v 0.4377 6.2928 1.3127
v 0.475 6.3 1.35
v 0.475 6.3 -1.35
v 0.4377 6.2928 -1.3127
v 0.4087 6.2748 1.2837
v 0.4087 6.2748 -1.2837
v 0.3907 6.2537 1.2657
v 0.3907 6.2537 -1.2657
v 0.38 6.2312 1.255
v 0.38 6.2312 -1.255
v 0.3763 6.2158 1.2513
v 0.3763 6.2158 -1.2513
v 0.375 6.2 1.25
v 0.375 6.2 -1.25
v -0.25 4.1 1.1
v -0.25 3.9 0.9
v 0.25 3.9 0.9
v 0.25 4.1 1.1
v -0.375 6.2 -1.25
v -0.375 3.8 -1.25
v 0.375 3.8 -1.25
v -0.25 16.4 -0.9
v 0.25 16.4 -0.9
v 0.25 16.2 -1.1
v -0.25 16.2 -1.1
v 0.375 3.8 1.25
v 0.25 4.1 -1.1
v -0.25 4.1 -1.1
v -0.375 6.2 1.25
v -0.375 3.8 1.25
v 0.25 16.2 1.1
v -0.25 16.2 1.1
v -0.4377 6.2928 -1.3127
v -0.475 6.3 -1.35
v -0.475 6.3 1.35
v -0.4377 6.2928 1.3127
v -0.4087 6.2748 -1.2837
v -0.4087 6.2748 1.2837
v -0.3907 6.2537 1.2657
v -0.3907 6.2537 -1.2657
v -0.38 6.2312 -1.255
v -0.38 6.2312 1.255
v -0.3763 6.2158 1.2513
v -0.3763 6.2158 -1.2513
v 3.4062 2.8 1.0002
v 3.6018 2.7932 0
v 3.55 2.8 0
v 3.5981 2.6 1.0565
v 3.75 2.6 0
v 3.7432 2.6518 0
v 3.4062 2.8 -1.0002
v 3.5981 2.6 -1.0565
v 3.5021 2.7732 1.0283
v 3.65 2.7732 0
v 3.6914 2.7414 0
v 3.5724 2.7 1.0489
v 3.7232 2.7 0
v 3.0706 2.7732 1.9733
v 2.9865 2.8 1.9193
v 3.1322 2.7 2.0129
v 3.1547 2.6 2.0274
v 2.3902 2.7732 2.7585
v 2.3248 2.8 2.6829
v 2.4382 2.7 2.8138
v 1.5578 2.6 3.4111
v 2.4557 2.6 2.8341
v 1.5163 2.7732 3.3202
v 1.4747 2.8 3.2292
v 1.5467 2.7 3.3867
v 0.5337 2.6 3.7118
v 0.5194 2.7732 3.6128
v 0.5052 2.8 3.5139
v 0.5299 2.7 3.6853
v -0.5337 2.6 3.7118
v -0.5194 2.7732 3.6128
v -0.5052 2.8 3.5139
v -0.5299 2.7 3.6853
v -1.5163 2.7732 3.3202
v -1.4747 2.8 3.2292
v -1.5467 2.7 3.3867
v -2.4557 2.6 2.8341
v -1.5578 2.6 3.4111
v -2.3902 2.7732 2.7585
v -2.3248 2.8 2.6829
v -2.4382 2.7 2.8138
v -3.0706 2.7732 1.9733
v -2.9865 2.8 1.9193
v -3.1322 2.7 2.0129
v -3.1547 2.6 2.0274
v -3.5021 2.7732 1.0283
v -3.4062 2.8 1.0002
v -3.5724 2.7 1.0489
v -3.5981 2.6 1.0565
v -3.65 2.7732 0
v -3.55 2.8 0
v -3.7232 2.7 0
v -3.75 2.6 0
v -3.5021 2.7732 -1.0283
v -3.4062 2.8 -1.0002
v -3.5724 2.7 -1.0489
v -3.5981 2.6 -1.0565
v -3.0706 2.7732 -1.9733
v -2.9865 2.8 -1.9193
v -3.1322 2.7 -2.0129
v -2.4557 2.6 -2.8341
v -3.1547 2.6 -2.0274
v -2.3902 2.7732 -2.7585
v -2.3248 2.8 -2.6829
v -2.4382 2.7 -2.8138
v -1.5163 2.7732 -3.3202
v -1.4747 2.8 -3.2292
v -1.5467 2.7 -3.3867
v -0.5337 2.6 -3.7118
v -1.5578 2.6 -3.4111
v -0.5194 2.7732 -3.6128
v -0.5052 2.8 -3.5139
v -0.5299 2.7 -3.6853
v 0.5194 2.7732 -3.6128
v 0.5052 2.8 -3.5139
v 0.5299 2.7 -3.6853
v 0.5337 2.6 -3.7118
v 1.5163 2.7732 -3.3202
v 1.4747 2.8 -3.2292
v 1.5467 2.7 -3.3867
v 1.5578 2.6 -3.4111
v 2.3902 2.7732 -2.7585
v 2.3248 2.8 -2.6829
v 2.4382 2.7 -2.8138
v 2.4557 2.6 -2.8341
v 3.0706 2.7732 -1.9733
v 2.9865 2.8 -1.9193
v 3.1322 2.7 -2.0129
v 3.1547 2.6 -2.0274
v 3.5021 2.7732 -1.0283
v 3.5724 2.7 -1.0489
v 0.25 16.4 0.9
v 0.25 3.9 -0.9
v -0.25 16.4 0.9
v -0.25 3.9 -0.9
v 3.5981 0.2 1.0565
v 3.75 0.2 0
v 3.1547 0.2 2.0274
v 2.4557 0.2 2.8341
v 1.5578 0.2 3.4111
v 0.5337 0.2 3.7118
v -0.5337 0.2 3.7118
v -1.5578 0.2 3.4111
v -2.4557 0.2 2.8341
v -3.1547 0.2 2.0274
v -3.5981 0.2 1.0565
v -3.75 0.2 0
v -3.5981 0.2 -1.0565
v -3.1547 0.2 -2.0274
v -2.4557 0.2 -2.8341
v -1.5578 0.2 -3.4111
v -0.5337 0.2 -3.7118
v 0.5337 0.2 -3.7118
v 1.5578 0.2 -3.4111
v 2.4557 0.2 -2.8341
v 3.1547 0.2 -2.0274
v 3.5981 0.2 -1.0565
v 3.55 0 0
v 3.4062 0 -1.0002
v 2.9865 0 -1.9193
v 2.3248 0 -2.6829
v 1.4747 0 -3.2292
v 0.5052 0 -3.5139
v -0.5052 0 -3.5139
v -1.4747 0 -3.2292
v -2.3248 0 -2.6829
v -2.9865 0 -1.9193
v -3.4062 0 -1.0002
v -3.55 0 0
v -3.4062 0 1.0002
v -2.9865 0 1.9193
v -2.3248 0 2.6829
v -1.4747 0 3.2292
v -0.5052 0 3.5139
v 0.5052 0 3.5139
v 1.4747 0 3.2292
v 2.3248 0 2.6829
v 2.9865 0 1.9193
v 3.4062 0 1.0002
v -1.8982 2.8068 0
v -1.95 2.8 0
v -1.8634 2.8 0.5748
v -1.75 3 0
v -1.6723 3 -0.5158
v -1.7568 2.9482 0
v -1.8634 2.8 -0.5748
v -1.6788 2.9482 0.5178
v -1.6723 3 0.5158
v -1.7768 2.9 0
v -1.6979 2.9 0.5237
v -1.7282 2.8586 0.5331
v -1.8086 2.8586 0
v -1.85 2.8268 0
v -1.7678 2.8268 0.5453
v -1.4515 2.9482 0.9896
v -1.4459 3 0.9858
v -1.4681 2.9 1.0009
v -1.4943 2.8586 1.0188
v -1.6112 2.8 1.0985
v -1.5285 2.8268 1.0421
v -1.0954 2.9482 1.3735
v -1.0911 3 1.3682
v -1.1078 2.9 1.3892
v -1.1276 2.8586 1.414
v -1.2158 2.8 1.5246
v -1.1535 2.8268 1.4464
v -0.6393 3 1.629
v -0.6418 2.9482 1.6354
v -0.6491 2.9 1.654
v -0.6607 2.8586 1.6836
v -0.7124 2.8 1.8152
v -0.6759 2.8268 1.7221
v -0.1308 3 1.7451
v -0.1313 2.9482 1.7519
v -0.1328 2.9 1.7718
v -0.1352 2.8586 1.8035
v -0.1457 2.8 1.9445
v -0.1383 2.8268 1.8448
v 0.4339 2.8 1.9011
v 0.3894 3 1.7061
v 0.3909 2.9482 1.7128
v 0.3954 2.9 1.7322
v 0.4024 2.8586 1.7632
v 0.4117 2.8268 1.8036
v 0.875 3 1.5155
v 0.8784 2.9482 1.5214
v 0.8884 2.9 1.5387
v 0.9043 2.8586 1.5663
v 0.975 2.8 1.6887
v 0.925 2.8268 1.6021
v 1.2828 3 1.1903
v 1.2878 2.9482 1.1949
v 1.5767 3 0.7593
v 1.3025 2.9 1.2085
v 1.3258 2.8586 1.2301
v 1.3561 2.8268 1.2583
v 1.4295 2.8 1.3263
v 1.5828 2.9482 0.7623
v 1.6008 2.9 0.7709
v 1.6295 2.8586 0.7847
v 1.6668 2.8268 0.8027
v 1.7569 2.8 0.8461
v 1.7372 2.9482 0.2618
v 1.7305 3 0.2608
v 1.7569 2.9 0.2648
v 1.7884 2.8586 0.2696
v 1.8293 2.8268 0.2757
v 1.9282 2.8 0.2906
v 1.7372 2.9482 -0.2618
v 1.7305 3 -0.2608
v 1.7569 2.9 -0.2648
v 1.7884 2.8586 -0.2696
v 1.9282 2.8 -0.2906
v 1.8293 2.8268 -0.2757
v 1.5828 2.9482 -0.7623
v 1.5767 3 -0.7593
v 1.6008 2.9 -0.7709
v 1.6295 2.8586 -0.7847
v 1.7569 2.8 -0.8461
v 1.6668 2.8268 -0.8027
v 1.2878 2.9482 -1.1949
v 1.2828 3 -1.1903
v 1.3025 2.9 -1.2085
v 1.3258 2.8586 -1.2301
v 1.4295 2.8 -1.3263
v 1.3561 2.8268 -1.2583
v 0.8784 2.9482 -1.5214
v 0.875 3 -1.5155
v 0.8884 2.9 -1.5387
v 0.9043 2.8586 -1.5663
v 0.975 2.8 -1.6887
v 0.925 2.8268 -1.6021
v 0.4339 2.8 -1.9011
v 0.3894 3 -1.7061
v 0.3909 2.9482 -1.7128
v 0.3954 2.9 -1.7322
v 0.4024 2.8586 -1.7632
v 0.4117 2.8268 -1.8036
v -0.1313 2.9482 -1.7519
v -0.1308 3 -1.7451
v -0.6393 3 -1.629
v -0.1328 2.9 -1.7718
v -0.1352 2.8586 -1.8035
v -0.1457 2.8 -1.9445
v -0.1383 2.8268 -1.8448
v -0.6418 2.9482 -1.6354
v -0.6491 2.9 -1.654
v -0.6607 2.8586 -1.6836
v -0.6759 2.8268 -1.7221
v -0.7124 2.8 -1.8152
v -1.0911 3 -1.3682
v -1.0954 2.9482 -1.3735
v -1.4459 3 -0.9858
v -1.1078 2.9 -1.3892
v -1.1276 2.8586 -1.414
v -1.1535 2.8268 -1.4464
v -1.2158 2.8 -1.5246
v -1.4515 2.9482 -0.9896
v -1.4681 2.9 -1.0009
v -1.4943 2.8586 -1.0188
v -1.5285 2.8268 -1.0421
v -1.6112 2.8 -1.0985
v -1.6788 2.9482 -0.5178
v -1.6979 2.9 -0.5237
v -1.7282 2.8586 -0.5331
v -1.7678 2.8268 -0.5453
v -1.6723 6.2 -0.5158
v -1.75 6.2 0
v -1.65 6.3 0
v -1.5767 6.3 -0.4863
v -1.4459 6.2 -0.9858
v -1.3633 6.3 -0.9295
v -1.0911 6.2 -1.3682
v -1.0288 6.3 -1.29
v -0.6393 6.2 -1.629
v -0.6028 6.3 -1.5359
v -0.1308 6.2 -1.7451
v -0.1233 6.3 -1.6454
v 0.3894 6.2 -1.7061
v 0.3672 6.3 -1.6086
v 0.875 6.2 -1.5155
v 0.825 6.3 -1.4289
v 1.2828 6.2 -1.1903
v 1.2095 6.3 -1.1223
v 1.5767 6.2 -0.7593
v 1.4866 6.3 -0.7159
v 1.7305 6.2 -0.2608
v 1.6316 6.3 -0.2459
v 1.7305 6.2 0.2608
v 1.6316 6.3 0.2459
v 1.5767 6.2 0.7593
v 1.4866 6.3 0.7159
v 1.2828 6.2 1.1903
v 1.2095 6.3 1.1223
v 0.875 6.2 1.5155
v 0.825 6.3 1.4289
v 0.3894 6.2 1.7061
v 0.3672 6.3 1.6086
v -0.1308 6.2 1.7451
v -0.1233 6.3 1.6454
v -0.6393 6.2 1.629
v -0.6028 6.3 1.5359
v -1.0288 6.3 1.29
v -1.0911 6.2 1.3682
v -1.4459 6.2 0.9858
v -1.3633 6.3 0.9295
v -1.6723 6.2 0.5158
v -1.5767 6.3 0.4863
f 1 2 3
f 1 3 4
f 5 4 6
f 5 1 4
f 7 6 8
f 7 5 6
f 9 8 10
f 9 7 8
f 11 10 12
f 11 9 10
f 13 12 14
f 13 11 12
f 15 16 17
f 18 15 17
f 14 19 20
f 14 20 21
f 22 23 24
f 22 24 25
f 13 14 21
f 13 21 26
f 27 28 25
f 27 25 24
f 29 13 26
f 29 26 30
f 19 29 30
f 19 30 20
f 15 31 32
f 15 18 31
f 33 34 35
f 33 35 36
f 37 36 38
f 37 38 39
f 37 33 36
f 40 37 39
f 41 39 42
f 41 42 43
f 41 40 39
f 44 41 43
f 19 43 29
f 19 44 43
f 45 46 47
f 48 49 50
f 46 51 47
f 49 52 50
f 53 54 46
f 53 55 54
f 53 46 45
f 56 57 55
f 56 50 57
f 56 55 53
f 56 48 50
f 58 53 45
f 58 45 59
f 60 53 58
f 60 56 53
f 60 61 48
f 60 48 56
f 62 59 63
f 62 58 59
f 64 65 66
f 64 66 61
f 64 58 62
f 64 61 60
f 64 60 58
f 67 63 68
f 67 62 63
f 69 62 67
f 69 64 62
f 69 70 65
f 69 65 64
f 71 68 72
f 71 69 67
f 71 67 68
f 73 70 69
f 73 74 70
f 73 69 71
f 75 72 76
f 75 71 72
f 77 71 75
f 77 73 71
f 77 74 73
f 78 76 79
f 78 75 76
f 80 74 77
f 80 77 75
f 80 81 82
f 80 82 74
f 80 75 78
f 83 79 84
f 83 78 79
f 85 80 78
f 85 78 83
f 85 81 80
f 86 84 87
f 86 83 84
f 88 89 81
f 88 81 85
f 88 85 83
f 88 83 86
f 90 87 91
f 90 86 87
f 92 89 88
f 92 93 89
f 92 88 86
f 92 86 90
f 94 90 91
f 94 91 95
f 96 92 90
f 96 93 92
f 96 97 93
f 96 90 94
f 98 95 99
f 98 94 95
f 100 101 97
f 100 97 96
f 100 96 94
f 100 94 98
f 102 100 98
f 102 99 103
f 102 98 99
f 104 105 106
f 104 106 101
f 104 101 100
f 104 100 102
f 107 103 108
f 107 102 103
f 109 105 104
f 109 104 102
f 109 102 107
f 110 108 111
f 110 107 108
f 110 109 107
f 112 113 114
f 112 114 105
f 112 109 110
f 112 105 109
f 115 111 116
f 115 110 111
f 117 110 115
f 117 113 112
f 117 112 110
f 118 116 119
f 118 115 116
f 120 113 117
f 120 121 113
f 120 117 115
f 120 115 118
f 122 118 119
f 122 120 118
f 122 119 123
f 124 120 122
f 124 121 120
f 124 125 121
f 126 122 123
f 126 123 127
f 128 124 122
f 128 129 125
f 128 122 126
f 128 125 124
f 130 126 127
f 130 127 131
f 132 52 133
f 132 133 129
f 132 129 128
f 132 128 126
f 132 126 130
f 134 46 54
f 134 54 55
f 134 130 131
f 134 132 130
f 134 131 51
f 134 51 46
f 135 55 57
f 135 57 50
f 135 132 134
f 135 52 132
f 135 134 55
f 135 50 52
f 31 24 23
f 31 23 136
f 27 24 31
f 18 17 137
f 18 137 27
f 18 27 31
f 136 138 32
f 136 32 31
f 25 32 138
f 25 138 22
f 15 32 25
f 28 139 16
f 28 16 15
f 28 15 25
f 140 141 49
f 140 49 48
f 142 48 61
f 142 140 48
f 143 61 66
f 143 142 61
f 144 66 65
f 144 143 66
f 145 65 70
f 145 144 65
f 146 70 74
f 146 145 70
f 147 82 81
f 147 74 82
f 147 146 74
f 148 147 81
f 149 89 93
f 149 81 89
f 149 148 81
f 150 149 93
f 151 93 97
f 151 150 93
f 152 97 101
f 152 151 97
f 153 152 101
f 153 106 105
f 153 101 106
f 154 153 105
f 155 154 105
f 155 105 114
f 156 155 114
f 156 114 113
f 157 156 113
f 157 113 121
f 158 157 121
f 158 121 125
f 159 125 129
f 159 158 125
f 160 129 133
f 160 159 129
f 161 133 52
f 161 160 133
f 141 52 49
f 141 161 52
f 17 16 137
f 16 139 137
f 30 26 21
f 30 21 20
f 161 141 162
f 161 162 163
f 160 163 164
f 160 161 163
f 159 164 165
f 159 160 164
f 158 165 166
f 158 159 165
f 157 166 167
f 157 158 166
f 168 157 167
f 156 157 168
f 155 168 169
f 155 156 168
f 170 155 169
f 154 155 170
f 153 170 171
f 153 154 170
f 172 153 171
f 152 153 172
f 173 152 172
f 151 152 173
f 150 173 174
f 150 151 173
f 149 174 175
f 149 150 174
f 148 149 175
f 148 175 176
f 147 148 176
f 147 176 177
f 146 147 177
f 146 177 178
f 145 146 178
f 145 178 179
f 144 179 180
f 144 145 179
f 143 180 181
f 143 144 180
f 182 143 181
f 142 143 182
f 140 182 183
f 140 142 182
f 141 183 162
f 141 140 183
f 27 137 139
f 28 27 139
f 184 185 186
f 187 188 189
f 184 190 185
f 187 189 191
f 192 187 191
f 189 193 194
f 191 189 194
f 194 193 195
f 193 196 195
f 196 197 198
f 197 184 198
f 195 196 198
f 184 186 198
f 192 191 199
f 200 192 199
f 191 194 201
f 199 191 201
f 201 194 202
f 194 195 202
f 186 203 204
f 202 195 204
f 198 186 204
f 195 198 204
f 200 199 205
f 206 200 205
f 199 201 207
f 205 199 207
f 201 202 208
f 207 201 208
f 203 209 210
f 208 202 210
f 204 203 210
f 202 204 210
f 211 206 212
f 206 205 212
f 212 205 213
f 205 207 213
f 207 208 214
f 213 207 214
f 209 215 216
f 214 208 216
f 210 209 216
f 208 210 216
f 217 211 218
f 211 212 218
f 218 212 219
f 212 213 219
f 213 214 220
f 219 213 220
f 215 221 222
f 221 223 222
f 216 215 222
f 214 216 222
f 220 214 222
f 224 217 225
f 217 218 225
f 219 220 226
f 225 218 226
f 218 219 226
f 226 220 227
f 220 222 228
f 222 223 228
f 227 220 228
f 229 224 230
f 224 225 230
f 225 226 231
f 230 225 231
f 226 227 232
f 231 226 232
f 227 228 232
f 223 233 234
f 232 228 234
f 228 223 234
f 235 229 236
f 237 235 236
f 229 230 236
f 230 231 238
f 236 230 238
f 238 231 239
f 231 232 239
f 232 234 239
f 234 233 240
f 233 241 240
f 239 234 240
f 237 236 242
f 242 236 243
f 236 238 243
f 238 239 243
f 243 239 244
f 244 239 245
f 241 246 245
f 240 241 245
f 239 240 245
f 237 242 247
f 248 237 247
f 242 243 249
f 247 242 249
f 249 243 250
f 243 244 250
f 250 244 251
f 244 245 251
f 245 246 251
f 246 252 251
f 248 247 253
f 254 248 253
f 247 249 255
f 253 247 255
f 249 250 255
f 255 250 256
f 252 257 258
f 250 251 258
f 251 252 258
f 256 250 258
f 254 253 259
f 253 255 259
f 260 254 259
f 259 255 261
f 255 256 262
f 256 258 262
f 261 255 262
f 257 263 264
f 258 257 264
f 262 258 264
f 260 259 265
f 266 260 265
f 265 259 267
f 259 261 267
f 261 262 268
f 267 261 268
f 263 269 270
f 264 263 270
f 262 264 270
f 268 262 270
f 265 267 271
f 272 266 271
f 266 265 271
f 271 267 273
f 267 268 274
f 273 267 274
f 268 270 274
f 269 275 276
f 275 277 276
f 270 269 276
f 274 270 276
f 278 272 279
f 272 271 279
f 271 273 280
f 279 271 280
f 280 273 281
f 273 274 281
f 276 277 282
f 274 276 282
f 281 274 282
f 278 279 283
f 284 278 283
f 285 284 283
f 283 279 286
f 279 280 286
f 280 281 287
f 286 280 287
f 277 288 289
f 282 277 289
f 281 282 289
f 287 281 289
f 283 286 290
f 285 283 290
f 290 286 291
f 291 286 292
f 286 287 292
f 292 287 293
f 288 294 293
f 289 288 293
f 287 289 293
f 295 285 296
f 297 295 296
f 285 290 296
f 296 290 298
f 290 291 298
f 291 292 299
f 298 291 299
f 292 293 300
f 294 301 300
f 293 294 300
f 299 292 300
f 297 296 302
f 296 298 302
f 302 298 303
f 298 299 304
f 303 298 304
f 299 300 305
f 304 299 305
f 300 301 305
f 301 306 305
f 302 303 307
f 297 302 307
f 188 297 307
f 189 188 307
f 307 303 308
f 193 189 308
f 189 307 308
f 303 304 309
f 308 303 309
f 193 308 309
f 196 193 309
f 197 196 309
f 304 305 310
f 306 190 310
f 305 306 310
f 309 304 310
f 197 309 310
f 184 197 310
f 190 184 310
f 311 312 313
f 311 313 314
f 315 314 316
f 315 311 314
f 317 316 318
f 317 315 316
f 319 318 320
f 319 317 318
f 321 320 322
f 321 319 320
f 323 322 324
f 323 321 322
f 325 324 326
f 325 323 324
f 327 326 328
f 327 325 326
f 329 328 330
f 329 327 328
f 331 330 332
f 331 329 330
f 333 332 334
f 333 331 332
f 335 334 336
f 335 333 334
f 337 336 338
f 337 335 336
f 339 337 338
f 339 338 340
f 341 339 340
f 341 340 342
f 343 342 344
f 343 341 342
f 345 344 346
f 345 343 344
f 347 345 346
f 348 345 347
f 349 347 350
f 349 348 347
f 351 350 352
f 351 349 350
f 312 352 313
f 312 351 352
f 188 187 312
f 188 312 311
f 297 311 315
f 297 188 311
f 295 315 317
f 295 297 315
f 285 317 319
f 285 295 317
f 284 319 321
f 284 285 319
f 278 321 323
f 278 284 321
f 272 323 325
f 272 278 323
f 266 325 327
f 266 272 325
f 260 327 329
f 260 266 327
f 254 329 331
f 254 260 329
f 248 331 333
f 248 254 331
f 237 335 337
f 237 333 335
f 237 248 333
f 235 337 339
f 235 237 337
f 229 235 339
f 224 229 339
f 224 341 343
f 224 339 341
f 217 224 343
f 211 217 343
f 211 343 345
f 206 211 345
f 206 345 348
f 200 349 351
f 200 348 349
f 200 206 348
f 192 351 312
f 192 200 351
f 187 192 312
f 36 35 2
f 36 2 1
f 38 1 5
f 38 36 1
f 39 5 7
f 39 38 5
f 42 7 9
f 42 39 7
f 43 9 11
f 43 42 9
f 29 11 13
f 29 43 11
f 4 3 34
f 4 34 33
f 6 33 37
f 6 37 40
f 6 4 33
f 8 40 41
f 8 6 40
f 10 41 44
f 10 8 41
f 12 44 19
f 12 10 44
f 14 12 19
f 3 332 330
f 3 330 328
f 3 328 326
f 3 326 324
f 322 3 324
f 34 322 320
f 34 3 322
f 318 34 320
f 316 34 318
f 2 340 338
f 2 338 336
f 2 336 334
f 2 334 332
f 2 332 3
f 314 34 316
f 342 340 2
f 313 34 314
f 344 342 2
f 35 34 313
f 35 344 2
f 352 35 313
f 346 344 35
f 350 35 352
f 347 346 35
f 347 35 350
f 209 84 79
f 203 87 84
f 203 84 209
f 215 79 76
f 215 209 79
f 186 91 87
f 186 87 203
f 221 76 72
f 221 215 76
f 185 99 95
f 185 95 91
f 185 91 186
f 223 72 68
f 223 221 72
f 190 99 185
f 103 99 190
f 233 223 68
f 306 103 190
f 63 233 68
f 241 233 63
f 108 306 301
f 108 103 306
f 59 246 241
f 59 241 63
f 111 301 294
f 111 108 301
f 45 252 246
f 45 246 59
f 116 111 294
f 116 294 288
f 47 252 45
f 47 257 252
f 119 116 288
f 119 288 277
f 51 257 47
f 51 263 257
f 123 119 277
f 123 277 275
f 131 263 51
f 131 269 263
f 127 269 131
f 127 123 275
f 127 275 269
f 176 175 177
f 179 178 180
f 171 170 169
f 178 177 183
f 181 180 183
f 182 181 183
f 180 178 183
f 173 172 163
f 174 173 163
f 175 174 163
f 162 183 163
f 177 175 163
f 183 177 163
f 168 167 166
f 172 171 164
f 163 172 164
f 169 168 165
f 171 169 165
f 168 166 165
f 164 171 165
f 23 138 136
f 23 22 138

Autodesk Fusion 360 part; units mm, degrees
sketch "Sketch1" plane through (0, 0, 0) normal (0, 1, 0) x (1, 0, 0) in component "Shutter_Cap"
  circle A0 centre (0, 0) radius 3.75
  dimension "d3" = 7.5
extrude "Extrude1" add sketch "Sketch1" along normal blind 2.8 makes body 1 in component "Shutter_Cap"
sketch "Sketch2" plane through (0, 2.8, 0) normal (0, 1, 0) x (-1, 0, 0) in component "Shutter_Cap"
  circle A0 centre (0, 0) radius 3.75
  circle A1 centre (0, 0) radius 1.75
  dimension "d8" = 3.5
extrude "Extrude2" add sketch "Sketch2" along normal blind 3.5 contours A1 bodies 1 in component "Shutter_Cap"
sketch "Sketch3" plane through (0, 6.3, 0) normal (0, 1, 0) x (-1, 0, 0) in component "Shutter_Cap"
  circle A0 centre (0, 0) radius 1.75
  line L0 (-0.375, 1.25) -> (0.375, 1.25)
  line L1 (0.375, 1.25) -> (0.375, -1.25)
  line L2 (0.375, -1.25) -> (-0.375, -1.25)
  line L3 (-0.375, -1.25) -> (-0.375, 1.25)
  line L4 (-0.375, 1.25) -> (0.375, -1.25) construction
  line L5 (0.375, 1.25) -> (-0.375, -1.25) construction
  dimension "d11" = 0.75
  dimension "d12" = 2.5
extrude "Extrude3" cut sketch "Sketch3" against normal blind 2.5 contours L0 L1 L2 L3 bodies 1 in component "Shutter_Cap"
chamfer "Chamfer1" distance 0.2 angle 45 1 edges at (-3.4962, 0, 1.3561) on bodies 1 in component "Shutter_Cap"
chamfer "Chamfer2" distance 0.1 angle 45 1 edges at (1.6316, 6.3, -0.6328) on bodies 1 in component "Shutter_Cap"
fillet "Fillet1" radius 0.2 2 edges at (1.6316, 2.8, 0.6328) (-3.4962, 2.8, 1.3561) on bodies 1 in component "Shutter_Cap"
fillet "Fillet2" radius 0.1 4 edges at (0, 6.3, -1.25) (-0.375, 6.3, 0) (0, 6.3, 1.25) (0.375, 6.3, 0) on bodies 1 in component "Shutter_Cap"
ref_plane "WorkPlane1" through (0, 3.9, 0) normal (0, 1, 0) x (0, 0, 1) in component "Shutter_Blade"
sketch "Sketch1 (2)" plane through (0, 3.9, 0) normal (0, 1, 0) x (1, 0, 0) in component "Shutter_Blade"
  line L0 (0.25, -1.1) -> (-0.25, -1.1)
  line L1 (-0.25, -1.1) -> (-0.25, 1.1)
  line L2 (-0.25, 1.1) -> (0.25, 1.1)
  line L3 (0.25, 1.1) -> (0.25, -1.1)
  line L4 (0.25, -1.1) -> (-0.25, 1.1) construction
  line L5 (-0.25, -1.1) -> (0.25, 1.1) construction
  dimension "d32" = 0.2
extrude "Extrude1'" add sketch "Sketch1 (2)" along normal blind 12.5 separate body makes body 2 in component "Shutter_Blade"
chamfer "Chamfer1'" distance 0.2 angle 45 4 edges at (0, 16.4, 1.1) (0, 16.4, -1.1) (0, 3.9, 1.1) (0, 3.9, -1.1) on bodies 2 in component "Shutter_Blade"
component "Shutter_Cap" placed x (1, 0, 0) y (0, 1, 0) z (0, 0, 1) at (0, 0, 0)
component "Shutter_Blade" placed x (1, 0, 0) y (0, 1, 0) z (0, 0, 1) at (0, 0, 0)
equation "Shutter_Cap_Head_Dia = 7.5 mm"
equation "Shutter_Cap_Head_Thk = 2.8 mm"
equation "d3 = Shutter_Cap_Head_Dia"
equation "d4 = Shutter_Cap_Head_Thk"
equation "Shutter_Cap_Shaft_Dia = 3.5 mm"
equation "Shutter_Cap_Shaft_Length = 3.5 mm"
equation "d8 = Shutter_Cap_Shaft_Dia"
equation "d9 = Shutter_Cap_Shaft_Length"
equation "d11 = Shutter_Cap_Slot_W"
equation "d12 = Shutter_Cap_Slot_L"
equation "d13 = -Shutter_Cap_Slot_D"
equation "Shutter_Cap_Slot_W = 0.75 mm"
equation "Shutter_Cap_Slot_L = 2.5 mm"
equation "Shutter_Cap_Slot_D = 2.5 mm"
equation "d25 = Shutter_Blade_W"
equation "d26 = Shutter_Blade_D"
equation "Shutter_Blade_W = 0.5 mm"
equation "Shutter_Blade_D = 2.2 mm"
equation "Shutter_Blade_L = 12.5 mm"
equation "d30 = Shutter_Blade_L"
